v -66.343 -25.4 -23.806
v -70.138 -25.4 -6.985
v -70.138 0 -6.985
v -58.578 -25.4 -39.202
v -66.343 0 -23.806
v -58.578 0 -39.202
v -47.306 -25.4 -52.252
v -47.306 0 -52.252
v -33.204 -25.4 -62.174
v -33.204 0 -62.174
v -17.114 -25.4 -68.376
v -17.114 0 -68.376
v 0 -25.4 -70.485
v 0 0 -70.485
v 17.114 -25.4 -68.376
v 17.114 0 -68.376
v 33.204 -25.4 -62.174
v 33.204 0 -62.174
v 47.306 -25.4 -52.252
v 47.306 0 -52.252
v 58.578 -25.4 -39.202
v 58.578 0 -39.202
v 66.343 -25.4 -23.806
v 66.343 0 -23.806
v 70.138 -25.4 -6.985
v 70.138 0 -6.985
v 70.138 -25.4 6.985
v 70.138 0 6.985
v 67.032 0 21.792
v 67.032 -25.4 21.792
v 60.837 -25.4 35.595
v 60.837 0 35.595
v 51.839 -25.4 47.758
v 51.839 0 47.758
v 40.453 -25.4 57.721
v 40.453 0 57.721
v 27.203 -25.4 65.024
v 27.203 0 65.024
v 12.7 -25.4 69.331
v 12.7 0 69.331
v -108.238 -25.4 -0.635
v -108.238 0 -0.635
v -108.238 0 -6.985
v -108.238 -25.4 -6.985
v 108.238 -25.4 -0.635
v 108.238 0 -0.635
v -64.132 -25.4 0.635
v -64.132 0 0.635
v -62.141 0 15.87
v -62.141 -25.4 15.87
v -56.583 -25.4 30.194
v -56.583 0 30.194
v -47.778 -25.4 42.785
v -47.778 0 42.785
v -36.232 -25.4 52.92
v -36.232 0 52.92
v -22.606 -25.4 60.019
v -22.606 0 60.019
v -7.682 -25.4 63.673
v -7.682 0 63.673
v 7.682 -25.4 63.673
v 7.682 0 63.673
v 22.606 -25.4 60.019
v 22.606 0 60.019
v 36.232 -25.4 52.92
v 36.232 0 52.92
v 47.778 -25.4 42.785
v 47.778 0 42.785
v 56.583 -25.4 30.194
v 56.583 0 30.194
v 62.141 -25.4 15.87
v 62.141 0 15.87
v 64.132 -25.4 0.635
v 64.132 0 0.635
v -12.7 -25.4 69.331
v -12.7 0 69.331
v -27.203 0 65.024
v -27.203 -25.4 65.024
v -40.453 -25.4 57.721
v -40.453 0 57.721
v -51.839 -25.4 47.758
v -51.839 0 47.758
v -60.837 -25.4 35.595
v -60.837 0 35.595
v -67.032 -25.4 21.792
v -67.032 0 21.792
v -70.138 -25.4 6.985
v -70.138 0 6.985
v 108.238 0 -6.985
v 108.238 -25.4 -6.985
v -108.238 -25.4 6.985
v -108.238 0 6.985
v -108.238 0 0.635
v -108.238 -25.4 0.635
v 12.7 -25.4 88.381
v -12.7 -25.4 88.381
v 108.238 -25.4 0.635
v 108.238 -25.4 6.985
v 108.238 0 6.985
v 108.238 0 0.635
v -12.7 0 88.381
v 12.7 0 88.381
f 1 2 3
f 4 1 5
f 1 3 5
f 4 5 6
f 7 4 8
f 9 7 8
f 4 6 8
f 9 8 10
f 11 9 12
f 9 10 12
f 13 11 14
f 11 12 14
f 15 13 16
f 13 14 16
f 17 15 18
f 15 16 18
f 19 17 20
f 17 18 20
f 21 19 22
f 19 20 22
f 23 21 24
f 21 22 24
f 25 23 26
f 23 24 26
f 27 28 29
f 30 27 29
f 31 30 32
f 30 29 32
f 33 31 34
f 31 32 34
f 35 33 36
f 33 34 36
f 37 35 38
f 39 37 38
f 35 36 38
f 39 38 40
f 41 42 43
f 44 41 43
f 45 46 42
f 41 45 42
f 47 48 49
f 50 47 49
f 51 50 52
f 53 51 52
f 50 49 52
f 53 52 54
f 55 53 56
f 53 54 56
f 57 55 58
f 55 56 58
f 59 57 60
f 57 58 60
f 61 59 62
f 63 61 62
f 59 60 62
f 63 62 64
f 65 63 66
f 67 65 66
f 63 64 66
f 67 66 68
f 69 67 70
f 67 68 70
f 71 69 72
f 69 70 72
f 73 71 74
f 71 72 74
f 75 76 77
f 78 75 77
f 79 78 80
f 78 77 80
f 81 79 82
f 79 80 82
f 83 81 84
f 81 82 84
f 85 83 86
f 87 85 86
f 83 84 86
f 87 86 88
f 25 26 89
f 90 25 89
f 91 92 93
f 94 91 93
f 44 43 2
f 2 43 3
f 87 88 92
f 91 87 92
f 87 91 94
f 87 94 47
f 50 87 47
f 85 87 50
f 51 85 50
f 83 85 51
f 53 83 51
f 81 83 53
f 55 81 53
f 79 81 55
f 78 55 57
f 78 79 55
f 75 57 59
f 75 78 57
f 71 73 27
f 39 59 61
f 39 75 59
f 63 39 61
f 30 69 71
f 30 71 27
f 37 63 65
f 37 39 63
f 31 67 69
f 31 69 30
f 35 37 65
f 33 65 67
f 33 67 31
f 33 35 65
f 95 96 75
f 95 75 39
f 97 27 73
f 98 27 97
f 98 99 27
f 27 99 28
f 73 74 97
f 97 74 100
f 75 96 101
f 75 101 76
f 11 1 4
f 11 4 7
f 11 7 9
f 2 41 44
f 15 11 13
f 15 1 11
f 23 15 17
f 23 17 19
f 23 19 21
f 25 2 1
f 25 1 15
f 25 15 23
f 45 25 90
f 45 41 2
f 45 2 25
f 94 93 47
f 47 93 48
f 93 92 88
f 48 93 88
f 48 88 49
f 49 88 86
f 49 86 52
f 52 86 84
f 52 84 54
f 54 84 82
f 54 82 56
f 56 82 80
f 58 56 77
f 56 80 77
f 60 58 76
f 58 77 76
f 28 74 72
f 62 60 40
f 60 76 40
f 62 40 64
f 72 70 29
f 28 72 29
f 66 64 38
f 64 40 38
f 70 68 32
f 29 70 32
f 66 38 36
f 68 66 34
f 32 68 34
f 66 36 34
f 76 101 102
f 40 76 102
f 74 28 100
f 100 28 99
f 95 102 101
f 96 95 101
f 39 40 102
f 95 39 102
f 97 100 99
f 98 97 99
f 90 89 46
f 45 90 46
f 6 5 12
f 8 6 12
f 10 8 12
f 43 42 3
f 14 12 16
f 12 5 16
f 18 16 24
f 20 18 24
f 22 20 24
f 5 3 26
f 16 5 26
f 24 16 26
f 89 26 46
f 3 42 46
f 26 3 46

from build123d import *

# Parameters (mm, degrees)
F1_DEPTH = 25.4


with BuildPart() as f1:
    # F0 (on Front) → F1 (new body)
    with BuildSketch(Plane.XZ):
        with BuildLine():
            Line((0, -0.635), (-64.131856, -0.635))
            ThreePointArc((-64.131856, -0.635), (0, -64.135), (64.131856, -0.635))
            Line((64.131856, -0.635), (0, -0.635))
        make_face()
        with BuildLine():
            ThreePointArc((64.131856, -0.635), (0, -64.135), (-64.131856, -0.635))
            Line((-64.131856, -0.635), (-108.238042, -0.635))
            Line((-108.238042, -0.635), (-108.238042, -6.985))
            Line((-108.238042, -6.985), (-70.138042, -6.985))
            ThreePointArc((-70.138042, -6.985), (0, -70.485), (70.138042, -6.985))
            Line((70.138042, -6.985), (108.238042, -6.985))
            Line((108.238042, -6.985), (108.238042, -0.635))
            Line((108.238042, -0.635), (70.48214, -0.635))
            Line((70.48214, -0.635), (64.131856, -0.635))
        make_face()
        with BuildLine():
            Line((-12.7, 88.381416), (-12.7, 69.331416))
            ThreePointArc((-12.7, 69.331416), (-51.839215, 47.758047), (-70.138042, 6.985))
            Line((-70.138042, 6.985), (-108.238042, 6.985))
            Line((-108.238042, 6.985), (-108.238042, 0.635))
            Line((-108.238042, 0.635), (-64.131856, 0.635))
            ThreePointArc((-64.131856, 0.635), (0, 64.135), (64.131856, 0.635))
            Line((64.131856, 0.635), (70.48214, 0.635))
            Line((70.48214, 0.635), (108.238042, 0.635))
            Line((108.238042, 0.635), (108.238042, 6.985))
            Line((108.238042, 6.985), (70.138042, 6.985))
            ThreePointArc((70.138042, 6.985), (51.839215, 47.758047), (12.7, 69.331416))
            Line((12.7, 69.331416), (12.7, 88.381416))
            Line((12.7, 88.381416), (-12.7, 88.381416))
        make_face()
    extrude(amount=F1_DEPTH)


solid = f1.part
